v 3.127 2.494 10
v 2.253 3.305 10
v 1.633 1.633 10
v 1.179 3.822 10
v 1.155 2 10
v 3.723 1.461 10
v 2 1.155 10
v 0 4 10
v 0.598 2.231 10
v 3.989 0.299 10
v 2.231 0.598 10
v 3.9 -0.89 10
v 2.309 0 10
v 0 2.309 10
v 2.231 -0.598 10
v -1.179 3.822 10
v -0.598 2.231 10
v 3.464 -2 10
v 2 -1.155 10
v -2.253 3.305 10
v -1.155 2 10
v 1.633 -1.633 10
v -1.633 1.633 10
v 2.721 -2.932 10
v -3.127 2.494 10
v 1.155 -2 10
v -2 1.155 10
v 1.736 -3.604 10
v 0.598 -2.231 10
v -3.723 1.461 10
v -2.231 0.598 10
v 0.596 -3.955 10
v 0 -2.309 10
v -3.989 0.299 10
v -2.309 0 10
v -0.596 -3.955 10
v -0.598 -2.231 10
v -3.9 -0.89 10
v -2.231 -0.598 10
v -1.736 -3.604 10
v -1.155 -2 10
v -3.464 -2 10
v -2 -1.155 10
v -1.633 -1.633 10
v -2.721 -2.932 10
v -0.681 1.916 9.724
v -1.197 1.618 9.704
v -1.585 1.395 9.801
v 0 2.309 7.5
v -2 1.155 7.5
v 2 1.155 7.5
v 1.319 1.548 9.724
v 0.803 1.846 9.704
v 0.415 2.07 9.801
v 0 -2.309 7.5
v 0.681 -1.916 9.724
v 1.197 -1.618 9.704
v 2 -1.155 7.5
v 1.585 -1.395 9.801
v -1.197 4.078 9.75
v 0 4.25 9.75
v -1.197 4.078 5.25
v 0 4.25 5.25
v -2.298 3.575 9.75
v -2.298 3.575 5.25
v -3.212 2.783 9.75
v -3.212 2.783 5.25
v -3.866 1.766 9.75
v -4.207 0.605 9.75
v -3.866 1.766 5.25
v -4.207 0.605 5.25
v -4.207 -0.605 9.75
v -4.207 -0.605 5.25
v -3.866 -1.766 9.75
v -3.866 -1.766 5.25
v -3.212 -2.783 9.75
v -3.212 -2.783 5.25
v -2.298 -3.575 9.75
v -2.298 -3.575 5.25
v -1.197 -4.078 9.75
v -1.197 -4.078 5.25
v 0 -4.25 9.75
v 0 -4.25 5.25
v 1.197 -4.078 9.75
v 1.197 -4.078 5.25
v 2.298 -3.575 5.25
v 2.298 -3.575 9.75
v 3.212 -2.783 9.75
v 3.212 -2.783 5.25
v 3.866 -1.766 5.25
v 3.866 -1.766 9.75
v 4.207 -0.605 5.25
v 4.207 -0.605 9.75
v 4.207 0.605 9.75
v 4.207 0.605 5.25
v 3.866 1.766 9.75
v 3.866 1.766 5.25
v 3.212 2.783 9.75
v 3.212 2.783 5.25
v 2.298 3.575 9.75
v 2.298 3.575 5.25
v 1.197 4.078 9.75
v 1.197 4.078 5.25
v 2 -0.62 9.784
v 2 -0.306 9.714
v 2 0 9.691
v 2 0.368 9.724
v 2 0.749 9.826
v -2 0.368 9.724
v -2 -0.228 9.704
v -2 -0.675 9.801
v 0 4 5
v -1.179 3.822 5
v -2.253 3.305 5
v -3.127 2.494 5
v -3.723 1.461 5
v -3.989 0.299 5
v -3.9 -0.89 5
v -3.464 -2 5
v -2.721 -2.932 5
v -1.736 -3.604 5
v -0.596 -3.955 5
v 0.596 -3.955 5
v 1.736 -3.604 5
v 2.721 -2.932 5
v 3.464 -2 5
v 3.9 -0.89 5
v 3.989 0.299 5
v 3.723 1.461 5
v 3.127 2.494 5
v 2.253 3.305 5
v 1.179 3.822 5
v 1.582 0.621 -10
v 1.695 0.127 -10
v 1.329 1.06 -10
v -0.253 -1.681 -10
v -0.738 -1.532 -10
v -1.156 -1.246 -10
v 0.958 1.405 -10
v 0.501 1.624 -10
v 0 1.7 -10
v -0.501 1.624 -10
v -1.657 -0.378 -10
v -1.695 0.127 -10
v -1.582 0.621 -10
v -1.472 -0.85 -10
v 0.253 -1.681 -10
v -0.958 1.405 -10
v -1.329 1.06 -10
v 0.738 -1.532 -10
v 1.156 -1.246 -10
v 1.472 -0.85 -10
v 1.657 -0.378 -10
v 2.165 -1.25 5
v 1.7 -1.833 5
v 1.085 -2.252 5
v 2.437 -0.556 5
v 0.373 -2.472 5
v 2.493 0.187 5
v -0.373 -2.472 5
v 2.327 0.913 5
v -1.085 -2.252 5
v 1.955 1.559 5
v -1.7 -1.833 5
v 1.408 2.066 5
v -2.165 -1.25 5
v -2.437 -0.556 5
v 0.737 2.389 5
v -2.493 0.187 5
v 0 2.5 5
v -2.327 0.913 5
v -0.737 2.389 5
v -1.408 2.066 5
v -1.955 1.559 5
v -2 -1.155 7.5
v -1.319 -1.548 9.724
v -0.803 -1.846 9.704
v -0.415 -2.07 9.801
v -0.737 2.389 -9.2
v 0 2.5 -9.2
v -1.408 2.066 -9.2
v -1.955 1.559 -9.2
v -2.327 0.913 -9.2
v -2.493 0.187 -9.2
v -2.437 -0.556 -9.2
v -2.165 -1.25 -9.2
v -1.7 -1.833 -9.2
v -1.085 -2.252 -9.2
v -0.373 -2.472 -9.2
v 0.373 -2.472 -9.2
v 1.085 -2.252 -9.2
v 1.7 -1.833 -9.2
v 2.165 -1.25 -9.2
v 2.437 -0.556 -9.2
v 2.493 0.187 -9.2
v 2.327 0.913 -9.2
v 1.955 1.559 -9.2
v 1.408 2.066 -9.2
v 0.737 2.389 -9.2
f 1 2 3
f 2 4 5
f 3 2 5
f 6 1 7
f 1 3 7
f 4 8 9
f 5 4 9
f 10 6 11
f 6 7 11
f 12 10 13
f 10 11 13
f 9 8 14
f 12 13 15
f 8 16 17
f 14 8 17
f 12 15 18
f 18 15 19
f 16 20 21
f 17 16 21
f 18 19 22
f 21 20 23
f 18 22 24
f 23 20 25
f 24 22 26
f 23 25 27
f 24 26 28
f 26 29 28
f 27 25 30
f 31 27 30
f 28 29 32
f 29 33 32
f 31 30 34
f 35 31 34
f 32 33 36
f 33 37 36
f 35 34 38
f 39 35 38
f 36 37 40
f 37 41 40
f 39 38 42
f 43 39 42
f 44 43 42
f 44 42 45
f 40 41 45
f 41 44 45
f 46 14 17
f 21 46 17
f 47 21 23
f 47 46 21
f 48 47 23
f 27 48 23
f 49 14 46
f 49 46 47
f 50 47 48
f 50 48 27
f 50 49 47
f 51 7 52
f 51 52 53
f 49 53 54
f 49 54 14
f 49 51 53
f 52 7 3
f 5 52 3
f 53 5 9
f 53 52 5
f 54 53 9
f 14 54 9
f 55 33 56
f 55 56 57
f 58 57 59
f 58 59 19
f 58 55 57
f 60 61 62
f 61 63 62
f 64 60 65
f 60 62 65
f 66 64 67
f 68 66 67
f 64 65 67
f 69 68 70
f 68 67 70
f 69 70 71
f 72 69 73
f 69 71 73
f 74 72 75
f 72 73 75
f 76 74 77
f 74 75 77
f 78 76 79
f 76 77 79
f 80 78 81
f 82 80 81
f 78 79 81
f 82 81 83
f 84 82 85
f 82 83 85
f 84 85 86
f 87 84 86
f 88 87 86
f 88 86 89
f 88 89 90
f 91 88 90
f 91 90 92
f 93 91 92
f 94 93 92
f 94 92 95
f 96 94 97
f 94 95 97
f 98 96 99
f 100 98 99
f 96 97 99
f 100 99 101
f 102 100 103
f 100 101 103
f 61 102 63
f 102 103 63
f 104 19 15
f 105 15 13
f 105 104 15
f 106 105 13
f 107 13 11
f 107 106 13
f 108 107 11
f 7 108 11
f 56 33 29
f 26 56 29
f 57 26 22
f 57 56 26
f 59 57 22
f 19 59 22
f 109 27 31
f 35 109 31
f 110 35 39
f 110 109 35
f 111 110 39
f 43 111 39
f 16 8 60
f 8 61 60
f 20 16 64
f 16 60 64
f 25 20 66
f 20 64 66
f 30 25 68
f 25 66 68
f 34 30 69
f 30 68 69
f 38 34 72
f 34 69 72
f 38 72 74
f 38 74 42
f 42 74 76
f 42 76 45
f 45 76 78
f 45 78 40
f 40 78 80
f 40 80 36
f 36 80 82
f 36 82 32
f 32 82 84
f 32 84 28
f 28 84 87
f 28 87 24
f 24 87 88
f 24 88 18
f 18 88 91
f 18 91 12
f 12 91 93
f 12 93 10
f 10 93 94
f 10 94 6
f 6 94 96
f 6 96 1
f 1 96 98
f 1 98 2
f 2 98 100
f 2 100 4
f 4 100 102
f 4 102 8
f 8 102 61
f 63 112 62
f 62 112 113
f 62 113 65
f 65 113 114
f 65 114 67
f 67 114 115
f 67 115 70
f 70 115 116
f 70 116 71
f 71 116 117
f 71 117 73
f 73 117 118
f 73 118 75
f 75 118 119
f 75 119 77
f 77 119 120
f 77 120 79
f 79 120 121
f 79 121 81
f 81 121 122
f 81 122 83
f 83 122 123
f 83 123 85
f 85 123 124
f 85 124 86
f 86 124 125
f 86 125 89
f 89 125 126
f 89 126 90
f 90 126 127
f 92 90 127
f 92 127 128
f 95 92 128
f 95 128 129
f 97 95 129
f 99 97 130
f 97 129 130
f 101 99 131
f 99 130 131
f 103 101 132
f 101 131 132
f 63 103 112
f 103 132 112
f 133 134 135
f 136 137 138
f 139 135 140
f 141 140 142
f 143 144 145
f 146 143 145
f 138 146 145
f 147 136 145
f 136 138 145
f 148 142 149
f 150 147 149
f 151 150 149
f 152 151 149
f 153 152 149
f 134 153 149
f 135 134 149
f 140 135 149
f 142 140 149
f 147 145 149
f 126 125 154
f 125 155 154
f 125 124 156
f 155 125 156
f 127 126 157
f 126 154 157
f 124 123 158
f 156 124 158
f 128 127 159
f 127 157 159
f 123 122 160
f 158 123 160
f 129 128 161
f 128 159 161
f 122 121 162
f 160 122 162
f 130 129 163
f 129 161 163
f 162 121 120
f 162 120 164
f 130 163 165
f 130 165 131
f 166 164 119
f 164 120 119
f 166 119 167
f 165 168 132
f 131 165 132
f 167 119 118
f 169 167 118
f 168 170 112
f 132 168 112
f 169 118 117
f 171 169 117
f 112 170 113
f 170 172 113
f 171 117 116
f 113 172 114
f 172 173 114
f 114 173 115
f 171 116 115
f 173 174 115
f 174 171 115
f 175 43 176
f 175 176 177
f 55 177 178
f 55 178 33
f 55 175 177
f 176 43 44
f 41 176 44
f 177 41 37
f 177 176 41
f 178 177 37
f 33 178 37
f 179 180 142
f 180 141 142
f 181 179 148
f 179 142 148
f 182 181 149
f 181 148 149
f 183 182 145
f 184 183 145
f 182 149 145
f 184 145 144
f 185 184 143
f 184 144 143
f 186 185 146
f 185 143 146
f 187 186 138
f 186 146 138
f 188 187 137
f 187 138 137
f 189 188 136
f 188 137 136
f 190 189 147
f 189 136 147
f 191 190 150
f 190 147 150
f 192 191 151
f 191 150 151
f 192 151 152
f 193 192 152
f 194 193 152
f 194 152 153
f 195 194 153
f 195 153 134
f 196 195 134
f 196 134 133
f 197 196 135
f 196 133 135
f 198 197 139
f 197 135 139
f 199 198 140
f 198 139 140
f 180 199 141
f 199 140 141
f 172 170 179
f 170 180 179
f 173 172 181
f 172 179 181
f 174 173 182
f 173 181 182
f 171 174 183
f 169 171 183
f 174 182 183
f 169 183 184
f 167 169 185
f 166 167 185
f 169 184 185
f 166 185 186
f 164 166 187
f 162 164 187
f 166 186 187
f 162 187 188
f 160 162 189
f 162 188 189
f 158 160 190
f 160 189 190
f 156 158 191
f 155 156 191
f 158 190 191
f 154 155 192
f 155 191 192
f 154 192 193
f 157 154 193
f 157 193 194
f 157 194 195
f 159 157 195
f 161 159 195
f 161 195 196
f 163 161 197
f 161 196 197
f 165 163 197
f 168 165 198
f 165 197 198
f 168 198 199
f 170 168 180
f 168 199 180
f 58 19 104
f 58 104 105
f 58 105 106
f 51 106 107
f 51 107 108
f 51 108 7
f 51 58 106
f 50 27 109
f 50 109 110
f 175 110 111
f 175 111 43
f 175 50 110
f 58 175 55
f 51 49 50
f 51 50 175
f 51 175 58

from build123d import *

# Parameters (mm, degrees)
CUT_EXTRUDE1_START = -2.5
CUT_EXTRUDE1_DEPTH = 2.5
SKETCH4_R          = 2.309401077
CUT_EXTRUDE2_DEPTH = 0.5
CUT_EXTRUDE2_TAPER = 45


with BuildPart() as part:
    # Sketch2 → Revolve1 (revolve)
    with BuildSketch(Plane(origin=(0, 0, 0), x_dir=(0, 0, -1), z_dir=(1, 0, 0))):
        Polygon((-9.75, 4.25), (-5.25, 4.25), (-5, 4), (-5, 2.5), (9.2, 2.5), (10, 1.7), (10, 0), (-10, 0), (-10, 4), align=None)
    revolve(axis=Axis((0, 0, -10), (0, 0, 1)))

    # Sketch3 → Cut-Extrude1 (cut)
    with BuildSketch(Plane.XY.offset(10).offset(CUT_EXTRUDE1_START)):
        Polygon((0, 2.309401077), (-2, 1.154700538), (-2, -1.154700538), (0, -2.309401077), (2, -1.154700538), (2, 1.154700538), align=None)
    extrude(amount=CUT_EXTRUDE1_DEPTH, mode=Mode.SUBTRACT)

    # Sketch4 → Cut-Extrude2 (cut)
    with BuildSketch(Plane.XY.offset(10)):
        Circle(SKETCH4_R)
    extrude(amount=-CUT_EXTRUDE2_DEPTH, taper=CUT_EXTRUDE2_TAPER, mode=Mode.SUBTRACT)


solid = part.part
